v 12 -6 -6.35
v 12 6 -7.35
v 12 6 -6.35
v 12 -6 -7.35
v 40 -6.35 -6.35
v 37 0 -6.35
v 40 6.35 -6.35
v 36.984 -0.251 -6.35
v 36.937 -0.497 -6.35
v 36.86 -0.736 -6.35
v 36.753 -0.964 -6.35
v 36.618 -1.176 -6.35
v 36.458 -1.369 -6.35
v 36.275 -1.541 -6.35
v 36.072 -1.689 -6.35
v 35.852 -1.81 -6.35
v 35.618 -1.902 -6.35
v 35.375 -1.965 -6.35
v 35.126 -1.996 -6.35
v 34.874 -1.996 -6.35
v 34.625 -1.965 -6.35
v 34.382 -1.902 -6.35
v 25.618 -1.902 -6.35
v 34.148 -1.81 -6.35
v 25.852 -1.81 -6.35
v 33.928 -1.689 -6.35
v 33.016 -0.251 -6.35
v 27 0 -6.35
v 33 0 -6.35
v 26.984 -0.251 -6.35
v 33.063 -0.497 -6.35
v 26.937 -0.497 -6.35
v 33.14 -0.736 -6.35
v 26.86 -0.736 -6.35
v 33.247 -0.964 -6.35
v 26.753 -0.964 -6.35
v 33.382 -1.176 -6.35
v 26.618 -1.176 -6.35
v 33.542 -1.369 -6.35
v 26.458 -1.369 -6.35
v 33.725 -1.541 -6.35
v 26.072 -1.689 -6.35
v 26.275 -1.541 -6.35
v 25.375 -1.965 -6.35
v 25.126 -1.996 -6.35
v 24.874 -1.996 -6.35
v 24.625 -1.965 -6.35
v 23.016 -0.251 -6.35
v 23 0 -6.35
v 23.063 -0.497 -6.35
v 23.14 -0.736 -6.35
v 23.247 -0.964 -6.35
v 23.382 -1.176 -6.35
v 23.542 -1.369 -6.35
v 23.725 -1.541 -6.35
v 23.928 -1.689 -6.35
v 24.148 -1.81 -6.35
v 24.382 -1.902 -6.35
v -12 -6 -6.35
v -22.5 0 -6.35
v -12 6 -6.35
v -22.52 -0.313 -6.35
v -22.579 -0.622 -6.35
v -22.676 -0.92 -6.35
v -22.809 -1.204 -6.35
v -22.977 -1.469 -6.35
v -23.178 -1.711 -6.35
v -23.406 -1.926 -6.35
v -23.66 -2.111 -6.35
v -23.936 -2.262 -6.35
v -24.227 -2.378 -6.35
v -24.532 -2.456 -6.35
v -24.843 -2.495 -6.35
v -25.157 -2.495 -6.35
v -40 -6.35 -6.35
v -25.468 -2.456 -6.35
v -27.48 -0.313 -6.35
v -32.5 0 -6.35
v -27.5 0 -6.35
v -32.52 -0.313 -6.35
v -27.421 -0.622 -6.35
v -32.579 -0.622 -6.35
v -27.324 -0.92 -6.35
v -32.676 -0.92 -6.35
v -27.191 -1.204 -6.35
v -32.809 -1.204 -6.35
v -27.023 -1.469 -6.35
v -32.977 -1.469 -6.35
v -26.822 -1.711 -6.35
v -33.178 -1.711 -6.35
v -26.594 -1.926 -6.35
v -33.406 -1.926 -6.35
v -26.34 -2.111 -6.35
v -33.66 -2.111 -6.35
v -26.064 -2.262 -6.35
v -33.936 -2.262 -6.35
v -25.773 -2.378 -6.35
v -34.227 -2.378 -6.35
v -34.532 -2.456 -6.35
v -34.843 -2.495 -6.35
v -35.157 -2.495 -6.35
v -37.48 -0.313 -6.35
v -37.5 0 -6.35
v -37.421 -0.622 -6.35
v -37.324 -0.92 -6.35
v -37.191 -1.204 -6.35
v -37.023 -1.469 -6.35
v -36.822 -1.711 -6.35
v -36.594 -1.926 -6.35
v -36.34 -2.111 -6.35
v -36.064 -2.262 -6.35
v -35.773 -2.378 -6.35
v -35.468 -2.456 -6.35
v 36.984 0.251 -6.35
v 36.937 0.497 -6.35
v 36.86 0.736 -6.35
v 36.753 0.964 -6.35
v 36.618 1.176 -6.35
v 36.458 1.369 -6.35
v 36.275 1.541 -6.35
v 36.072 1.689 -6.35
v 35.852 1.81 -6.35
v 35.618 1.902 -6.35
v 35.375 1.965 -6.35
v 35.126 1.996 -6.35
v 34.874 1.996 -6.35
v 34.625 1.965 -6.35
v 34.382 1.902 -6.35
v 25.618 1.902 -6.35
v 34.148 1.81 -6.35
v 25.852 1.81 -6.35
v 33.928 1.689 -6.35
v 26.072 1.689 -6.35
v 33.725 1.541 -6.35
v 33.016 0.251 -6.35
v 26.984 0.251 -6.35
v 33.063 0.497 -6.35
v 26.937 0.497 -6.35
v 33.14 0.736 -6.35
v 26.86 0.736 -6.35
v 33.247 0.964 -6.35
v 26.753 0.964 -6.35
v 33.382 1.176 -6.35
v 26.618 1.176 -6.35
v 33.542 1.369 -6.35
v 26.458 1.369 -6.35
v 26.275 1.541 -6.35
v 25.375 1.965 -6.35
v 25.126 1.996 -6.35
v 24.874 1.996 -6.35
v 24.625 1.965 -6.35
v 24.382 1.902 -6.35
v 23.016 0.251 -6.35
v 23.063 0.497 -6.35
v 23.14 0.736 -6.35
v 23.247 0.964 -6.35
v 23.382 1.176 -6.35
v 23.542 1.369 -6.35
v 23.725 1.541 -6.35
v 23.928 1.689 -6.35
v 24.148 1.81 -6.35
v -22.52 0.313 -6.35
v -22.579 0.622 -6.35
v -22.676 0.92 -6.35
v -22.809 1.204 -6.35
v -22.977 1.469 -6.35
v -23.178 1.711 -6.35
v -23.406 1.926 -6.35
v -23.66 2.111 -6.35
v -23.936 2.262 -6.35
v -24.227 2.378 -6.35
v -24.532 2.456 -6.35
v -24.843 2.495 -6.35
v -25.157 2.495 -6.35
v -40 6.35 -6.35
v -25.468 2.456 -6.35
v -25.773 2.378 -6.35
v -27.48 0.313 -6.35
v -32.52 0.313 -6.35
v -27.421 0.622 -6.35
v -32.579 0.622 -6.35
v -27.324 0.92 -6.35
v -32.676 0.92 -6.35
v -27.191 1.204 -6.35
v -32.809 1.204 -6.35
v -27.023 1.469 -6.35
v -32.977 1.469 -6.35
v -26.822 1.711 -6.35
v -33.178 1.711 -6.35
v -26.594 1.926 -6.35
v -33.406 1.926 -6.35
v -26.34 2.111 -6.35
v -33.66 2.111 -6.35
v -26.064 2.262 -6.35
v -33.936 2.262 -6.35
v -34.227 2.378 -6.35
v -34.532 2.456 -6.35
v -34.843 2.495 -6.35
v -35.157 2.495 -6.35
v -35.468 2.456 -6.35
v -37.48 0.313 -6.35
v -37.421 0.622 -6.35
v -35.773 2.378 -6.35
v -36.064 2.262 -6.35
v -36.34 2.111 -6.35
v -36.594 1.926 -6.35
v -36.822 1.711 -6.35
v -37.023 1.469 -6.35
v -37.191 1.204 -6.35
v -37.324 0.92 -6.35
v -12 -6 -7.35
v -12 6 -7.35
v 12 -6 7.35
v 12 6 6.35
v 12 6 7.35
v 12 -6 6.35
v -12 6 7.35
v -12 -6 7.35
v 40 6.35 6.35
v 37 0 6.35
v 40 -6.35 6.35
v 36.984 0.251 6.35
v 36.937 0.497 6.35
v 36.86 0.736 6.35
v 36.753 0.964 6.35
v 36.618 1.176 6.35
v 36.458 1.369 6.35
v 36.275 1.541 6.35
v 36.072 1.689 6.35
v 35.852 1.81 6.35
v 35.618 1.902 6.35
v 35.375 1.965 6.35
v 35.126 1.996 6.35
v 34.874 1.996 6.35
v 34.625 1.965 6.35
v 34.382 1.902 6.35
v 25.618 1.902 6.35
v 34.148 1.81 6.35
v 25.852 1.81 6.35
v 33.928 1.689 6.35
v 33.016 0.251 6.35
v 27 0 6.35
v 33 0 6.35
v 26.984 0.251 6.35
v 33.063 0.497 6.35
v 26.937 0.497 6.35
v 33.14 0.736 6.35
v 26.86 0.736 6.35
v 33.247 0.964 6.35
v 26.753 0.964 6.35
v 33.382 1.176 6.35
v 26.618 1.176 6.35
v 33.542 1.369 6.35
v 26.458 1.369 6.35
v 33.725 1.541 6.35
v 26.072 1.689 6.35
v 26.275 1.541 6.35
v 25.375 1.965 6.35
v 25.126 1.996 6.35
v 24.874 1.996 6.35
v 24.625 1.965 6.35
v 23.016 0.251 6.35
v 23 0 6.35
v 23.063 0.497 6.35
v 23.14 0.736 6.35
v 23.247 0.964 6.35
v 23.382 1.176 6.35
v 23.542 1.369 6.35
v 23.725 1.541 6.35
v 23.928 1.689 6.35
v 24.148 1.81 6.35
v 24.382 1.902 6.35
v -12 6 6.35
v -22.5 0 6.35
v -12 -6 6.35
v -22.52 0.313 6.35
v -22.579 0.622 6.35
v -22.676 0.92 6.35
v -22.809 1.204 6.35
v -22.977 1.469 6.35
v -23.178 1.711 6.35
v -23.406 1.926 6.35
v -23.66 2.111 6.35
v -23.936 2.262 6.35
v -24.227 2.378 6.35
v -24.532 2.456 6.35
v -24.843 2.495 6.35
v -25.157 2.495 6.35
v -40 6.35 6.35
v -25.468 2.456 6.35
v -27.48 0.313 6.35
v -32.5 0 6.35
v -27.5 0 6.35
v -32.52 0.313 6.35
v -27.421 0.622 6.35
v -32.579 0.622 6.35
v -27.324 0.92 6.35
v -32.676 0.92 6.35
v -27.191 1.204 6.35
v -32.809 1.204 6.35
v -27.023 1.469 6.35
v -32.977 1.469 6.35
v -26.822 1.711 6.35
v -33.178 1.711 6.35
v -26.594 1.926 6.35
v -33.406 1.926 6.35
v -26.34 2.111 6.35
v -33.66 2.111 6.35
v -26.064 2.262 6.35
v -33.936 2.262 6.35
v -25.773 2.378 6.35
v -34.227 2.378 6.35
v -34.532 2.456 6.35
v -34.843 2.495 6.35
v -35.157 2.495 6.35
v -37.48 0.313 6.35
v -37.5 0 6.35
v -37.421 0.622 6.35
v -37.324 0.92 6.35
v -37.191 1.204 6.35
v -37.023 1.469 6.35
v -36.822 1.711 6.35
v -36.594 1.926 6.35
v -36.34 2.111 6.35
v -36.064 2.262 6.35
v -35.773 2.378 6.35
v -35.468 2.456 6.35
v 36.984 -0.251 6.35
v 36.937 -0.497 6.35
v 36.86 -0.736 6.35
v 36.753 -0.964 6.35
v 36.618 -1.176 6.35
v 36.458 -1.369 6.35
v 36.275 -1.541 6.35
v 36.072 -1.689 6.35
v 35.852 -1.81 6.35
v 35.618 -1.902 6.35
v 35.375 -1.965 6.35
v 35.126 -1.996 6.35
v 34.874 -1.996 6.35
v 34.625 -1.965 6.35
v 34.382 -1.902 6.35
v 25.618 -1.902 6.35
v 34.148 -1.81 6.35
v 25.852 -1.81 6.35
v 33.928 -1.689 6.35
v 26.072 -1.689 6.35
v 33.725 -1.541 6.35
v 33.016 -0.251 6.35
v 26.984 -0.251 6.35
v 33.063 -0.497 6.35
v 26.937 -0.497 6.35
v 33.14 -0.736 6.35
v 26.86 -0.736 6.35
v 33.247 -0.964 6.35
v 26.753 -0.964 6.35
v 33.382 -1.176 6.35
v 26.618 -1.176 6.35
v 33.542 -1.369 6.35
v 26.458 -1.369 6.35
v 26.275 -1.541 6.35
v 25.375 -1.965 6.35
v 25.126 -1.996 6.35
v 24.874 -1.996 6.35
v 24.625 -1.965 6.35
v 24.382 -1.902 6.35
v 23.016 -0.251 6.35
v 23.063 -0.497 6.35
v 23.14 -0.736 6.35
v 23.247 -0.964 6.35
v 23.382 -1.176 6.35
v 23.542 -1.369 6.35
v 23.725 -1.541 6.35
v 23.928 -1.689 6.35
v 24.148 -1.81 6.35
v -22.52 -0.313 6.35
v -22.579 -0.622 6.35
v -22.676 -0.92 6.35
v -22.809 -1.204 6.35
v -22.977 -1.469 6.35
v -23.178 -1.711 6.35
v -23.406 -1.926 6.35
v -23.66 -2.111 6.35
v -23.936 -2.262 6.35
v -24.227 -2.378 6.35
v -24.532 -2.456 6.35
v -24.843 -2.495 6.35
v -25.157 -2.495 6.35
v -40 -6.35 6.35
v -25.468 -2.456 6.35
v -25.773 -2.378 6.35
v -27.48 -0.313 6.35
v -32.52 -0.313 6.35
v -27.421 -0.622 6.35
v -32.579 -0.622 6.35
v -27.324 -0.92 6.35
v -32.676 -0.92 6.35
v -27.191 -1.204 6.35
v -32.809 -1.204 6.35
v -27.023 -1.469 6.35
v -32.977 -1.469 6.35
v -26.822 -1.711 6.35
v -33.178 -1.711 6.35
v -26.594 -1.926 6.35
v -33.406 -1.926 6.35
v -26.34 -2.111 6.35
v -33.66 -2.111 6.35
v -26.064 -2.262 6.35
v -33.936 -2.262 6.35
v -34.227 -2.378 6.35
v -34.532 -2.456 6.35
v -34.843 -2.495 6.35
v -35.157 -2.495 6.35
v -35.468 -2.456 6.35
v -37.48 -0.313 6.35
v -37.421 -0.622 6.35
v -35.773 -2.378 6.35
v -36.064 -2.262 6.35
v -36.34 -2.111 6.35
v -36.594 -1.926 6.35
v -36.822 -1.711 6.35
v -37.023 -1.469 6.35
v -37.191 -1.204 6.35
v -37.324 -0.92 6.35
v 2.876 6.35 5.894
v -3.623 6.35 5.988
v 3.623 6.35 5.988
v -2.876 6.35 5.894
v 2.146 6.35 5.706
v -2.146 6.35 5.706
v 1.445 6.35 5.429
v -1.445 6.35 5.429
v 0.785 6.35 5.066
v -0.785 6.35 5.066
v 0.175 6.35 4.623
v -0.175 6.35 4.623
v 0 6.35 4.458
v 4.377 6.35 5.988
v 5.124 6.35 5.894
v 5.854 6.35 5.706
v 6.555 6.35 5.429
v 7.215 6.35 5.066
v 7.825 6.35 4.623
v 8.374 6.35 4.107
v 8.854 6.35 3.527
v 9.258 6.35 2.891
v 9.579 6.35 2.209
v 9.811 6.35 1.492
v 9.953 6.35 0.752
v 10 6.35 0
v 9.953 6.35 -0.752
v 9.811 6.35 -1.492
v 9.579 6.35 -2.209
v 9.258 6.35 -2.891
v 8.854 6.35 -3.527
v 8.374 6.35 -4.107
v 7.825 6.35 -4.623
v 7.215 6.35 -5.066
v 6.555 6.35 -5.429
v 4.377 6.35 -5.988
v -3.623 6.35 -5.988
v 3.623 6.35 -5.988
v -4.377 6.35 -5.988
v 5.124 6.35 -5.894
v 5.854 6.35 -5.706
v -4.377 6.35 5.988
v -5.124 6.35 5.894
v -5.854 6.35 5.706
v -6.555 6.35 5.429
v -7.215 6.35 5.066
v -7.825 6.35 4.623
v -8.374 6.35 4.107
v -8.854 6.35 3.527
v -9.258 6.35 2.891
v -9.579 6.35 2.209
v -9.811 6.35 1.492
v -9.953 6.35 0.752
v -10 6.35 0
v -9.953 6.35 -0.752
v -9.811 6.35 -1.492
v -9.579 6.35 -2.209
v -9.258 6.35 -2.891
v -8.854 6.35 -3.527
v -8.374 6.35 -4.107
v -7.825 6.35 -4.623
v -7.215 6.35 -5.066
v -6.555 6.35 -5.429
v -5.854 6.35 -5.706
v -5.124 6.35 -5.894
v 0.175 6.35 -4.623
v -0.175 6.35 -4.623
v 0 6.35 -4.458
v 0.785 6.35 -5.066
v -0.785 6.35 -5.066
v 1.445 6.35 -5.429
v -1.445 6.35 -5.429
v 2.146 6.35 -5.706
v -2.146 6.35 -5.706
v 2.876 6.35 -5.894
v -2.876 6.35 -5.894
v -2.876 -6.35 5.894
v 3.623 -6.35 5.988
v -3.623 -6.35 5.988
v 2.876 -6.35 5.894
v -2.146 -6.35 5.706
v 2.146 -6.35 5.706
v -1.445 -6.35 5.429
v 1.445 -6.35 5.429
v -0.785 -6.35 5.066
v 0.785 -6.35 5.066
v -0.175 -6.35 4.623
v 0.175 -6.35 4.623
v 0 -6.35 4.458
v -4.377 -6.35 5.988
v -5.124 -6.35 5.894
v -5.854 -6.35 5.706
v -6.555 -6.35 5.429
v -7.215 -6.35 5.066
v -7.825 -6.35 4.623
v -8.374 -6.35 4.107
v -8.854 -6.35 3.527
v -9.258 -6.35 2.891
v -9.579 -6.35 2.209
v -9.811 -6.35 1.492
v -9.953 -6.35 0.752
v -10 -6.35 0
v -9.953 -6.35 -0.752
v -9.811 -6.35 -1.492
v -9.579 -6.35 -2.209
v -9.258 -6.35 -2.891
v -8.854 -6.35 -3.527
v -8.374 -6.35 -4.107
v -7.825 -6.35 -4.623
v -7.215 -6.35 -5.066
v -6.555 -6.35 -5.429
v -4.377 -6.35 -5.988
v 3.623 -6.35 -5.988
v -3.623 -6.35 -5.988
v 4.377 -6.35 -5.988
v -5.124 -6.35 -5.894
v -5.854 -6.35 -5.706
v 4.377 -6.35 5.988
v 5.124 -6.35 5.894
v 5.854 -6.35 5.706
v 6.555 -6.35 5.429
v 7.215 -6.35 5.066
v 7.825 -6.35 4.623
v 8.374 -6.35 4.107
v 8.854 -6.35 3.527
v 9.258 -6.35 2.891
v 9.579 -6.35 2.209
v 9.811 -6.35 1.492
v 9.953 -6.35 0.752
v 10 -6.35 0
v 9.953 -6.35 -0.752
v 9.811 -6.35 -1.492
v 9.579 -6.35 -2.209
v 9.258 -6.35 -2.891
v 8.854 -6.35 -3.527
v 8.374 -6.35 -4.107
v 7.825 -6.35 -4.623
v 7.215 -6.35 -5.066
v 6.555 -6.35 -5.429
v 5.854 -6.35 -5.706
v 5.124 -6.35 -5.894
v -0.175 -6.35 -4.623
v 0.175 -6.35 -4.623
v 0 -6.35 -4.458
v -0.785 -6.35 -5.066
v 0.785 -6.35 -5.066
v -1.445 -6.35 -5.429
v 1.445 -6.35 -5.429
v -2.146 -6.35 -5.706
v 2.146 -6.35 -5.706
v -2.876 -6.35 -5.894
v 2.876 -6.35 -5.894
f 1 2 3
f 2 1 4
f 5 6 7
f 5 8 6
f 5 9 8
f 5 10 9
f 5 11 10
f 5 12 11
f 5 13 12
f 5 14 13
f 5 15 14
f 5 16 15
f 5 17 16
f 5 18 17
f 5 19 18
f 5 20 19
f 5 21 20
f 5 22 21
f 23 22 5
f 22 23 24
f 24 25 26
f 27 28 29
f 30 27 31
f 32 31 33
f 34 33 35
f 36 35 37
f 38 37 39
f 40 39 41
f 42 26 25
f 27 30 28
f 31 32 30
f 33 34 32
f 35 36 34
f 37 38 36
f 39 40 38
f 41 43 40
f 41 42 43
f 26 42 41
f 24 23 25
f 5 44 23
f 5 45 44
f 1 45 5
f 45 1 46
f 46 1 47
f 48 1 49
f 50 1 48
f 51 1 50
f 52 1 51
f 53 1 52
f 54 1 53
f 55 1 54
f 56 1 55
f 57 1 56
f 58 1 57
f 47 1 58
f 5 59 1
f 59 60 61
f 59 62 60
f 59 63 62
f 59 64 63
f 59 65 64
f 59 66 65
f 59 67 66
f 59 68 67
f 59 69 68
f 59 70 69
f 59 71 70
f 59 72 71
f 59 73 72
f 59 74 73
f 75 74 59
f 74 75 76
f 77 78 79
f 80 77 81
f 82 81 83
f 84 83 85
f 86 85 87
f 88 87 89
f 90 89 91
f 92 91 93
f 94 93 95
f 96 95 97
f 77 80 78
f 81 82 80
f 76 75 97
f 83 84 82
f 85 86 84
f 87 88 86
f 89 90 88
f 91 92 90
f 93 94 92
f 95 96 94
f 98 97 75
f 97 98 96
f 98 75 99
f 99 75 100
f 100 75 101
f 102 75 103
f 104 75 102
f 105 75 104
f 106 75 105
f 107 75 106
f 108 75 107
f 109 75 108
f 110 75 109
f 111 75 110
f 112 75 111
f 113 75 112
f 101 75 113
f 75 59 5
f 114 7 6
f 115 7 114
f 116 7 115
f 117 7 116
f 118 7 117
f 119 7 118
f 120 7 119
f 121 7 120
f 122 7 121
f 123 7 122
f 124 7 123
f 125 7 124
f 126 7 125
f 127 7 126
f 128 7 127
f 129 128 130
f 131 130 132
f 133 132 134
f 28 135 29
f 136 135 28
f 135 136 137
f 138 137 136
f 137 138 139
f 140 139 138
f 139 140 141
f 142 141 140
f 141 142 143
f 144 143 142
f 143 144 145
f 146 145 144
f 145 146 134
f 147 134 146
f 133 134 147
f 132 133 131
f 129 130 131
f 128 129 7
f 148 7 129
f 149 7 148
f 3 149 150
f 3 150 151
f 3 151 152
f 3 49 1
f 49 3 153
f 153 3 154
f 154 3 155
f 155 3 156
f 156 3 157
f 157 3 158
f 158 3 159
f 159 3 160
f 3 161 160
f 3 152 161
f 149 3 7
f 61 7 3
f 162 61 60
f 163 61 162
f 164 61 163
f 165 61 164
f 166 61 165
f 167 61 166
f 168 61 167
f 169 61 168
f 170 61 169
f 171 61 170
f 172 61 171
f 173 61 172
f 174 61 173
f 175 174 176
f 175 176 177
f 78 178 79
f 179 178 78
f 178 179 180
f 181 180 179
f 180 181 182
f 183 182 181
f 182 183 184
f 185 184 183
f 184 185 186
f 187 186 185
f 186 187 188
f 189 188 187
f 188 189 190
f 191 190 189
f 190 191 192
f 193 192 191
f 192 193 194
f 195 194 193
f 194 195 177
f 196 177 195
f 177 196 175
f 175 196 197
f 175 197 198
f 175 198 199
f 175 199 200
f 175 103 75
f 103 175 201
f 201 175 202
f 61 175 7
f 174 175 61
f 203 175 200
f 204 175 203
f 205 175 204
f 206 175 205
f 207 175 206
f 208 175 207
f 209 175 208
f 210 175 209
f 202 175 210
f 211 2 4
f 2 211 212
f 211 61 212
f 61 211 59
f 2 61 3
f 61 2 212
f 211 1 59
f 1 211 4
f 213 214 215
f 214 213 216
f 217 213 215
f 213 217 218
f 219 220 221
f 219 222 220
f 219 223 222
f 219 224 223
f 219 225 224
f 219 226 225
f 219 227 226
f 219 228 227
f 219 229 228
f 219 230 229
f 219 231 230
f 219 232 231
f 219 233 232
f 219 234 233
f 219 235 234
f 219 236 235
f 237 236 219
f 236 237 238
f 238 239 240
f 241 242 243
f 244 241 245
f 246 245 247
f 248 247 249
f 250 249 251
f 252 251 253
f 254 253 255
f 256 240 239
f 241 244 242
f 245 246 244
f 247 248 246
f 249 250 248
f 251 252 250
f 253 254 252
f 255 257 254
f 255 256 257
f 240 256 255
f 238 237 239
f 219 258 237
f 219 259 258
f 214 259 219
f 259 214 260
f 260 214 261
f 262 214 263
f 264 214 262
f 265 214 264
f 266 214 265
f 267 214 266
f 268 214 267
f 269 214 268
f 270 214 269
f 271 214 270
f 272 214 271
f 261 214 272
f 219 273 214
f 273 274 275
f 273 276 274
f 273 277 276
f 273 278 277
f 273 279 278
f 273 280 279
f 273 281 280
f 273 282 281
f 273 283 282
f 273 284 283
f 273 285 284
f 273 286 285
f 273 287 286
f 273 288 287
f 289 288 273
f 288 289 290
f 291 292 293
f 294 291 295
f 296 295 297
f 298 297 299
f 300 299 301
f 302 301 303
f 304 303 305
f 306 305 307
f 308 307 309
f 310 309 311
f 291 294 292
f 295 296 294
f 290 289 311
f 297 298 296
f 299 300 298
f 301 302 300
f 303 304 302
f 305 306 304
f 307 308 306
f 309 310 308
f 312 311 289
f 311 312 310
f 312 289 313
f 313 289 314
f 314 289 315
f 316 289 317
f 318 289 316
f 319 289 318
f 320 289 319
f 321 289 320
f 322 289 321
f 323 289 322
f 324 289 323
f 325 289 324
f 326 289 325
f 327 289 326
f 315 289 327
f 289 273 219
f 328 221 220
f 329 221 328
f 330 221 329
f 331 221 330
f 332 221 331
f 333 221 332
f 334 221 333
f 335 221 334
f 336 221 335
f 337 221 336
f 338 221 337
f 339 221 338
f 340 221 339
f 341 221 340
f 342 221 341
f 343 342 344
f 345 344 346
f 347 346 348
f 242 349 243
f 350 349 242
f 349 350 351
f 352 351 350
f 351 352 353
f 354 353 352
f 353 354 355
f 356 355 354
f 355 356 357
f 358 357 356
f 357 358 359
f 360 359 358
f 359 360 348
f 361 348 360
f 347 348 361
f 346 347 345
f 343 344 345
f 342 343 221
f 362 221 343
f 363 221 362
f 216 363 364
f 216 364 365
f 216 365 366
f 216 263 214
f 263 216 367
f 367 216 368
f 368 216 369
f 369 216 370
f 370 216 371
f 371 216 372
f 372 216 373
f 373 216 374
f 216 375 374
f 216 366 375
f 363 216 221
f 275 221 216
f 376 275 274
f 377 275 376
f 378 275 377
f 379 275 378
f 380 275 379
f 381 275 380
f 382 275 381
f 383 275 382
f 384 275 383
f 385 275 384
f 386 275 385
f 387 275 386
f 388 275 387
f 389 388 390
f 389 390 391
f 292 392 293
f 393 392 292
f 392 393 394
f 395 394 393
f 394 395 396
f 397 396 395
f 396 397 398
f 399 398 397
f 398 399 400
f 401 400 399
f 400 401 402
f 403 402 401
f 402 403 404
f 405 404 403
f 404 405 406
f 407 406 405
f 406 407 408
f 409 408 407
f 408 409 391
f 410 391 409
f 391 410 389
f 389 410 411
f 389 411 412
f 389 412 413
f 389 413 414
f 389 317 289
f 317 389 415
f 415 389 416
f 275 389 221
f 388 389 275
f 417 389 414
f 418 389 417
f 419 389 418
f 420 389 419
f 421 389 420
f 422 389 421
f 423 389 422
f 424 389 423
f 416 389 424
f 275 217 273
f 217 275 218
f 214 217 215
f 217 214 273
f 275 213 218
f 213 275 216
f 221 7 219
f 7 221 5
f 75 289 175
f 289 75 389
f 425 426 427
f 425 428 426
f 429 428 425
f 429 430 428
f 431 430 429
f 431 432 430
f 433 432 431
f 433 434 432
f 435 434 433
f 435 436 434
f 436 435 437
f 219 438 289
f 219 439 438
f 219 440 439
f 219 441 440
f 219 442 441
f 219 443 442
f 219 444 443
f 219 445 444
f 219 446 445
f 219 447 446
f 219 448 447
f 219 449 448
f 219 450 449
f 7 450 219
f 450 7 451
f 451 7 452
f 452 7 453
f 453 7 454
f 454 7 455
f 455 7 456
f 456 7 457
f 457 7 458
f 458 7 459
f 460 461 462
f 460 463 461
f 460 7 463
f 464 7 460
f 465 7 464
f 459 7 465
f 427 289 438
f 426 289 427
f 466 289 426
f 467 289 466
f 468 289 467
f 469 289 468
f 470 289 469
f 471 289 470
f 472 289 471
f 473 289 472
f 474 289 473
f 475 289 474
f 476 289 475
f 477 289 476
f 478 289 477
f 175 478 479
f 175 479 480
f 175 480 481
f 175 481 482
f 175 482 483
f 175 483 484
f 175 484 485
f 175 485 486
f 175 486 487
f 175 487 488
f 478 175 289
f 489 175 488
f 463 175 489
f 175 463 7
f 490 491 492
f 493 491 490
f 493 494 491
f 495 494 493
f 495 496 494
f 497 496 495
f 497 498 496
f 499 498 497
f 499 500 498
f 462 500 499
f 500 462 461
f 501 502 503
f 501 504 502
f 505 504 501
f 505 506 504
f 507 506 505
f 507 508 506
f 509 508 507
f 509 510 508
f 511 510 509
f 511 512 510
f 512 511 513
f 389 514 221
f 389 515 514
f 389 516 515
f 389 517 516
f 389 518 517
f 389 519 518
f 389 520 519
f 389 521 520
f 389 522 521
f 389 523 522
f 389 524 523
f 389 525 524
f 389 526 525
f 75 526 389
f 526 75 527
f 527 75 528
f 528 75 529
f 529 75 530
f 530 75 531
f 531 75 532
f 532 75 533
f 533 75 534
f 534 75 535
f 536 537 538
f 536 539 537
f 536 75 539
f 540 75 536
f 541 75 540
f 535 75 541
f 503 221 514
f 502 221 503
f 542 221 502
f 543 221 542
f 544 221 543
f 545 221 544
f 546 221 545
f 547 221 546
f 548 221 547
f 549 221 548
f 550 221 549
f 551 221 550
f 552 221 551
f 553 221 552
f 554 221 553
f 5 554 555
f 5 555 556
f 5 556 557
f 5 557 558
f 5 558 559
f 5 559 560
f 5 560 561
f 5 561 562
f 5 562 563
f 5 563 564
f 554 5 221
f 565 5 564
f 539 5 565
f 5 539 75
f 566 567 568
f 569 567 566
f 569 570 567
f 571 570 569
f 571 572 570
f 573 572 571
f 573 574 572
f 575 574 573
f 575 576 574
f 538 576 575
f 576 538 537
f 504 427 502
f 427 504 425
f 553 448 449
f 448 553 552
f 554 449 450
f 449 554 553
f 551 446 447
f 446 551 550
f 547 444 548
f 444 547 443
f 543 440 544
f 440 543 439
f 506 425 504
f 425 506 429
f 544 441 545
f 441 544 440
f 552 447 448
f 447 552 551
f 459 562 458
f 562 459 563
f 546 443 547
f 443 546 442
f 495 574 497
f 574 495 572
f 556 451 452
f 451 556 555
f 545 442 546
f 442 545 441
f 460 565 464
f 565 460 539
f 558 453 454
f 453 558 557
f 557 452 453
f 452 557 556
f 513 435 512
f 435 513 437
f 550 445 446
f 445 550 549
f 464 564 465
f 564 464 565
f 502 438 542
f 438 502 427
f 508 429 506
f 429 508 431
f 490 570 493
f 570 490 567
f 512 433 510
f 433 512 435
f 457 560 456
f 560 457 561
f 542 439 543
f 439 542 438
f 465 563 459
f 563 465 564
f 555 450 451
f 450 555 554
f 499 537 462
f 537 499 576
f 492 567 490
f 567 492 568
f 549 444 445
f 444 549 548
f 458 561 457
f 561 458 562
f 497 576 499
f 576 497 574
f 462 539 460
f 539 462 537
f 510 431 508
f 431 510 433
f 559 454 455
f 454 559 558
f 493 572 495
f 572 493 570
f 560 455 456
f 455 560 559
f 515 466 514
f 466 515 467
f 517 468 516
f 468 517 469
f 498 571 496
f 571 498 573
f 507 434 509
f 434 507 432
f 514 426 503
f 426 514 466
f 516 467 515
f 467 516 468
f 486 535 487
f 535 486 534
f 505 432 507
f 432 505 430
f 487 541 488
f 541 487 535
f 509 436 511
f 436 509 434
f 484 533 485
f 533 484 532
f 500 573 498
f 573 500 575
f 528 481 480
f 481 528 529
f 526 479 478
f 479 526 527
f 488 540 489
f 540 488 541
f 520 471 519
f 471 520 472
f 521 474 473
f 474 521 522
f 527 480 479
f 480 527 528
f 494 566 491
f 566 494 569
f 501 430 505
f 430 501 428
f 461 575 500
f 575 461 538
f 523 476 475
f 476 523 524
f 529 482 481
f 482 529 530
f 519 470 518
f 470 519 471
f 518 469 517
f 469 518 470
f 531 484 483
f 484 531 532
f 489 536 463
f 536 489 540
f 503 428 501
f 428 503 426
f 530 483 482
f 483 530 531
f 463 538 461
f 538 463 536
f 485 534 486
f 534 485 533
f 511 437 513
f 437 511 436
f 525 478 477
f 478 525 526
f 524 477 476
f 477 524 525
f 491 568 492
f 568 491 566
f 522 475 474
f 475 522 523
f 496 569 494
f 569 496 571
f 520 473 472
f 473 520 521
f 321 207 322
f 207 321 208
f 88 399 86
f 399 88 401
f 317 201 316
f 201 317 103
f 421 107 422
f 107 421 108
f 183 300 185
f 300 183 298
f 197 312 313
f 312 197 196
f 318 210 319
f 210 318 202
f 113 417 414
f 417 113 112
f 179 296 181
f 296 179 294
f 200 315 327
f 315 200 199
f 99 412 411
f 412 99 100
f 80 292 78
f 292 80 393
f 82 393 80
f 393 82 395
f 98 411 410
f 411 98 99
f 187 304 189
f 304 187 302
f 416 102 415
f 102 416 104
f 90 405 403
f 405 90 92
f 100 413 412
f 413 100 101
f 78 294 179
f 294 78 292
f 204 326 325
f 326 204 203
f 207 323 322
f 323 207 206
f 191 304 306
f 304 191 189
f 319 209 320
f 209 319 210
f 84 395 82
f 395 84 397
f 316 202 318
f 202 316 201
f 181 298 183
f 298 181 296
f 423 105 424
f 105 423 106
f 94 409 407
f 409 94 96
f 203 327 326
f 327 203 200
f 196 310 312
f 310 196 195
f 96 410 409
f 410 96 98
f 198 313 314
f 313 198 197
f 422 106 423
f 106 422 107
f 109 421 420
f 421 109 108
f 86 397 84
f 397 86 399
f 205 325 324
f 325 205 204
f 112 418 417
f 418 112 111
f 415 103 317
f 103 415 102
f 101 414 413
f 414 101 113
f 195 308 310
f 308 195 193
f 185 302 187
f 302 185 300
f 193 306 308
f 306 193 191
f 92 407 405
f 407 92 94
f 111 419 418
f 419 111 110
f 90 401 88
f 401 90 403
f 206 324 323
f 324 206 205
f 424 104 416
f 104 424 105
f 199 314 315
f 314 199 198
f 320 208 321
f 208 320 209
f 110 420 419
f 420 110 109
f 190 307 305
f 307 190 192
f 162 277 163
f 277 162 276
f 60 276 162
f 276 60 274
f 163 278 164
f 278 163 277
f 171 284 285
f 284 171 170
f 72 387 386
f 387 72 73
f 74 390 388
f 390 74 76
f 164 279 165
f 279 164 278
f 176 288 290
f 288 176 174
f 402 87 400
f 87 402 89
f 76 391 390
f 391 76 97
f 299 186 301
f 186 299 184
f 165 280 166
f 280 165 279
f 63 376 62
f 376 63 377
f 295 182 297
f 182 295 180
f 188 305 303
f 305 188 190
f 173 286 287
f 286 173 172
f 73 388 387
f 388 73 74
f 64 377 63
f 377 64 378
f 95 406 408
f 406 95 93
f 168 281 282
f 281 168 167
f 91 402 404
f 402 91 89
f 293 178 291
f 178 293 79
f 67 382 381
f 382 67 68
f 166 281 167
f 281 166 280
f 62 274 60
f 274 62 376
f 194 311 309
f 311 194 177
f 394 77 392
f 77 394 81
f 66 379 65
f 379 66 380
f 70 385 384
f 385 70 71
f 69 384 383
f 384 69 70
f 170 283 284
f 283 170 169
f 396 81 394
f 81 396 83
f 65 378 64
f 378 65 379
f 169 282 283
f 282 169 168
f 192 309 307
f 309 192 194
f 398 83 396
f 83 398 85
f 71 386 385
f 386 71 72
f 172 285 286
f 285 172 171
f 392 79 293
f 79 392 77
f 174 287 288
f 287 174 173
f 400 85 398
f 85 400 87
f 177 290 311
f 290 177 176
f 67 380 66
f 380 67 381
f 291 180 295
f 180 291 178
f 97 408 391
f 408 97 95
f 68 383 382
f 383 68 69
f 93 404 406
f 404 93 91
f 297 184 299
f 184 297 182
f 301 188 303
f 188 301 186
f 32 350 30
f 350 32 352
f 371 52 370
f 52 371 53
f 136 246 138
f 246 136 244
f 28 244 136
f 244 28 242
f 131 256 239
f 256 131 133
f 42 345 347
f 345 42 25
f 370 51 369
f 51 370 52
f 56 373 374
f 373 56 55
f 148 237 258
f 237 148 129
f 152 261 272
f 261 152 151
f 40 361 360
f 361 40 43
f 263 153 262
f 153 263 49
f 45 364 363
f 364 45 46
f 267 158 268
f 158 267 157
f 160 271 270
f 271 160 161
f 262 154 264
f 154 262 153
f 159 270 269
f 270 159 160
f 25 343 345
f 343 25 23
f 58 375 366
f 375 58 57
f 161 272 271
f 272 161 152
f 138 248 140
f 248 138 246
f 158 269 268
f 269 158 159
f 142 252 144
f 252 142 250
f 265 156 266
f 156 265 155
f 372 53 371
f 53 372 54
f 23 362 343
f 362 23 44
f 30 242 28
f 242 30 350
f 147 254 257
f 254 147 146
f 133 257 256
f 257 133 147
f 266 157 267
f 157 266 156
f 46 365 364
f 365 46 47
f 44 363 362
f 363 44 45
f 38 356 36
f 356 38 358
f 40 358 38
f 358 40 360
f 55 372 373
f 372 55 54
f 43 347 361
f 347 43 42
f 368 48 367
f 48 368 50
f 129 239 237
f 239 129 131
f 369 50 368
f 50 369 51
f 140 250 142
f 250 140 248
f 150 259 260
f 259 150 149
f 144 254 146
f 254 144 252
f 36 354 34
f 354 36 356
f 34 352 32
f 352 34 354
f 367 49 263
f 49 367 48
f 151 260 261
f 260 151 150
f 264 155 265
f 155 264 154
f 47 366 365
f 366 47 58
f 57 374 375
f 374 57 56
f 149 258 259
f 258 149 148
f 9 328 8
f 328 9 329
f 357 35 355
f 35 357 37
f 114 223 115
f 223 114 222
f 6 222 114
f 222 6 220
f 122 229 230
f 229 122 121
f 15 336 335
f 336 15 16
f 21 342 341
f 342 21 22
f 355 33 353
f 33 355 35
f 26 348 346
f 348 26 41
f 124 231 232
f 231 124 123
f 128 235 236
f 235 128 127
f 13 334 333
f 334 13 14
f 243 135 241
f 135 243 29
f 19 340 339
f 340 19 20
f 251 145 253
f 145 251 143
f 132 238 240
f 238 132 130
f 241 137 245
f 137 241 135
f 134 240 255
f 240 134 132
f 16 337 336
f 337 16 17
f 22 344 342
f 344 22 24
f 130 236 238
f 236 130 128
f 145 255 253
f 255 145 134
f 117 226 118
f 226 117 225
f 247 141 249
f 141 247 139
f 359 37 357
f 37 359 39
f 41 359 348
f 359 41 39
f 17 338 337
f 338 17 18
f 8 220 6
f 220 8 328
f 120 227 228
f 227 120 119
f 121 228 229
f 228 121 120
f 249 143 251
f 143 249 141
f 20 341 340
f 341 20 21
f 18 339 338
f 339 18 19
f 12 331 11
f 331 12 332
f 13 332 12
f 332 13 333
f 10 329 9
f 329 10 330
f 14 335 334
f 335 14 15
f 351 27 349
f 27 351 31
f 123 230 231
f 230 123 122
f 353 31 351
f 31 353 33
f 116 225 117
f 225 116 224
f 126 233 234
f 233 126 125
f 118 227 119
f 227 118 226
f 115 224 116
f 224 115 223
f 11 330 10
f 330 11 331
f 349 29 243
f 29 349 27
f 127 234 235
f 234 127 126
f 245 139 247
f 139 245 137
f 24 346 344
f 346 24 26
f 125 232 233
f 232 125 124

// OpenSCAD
/**
 * @file load_cell_generator.scad
 * @brief Generates a load cell with strain gages and cable routing.
 */

/**
 * Generates a load cell with strain gages and cable routing.
 *
 * @param {number} cell_dims[1] - Width of the load cell.
 * @param {number} cell_dims[0] - Length of the load cell.
 * @param {number} cell_dims[2] - Height of the load cell.
 * @param {number[]} sensor_dims - Dimensions of the strain gages.
 * @param {string} [load_cell_color="silver"] - Color of the load cell.
 * @param {string} [sensor_color="white"] - Color of the strain gages.
 */
module load_cell_generator(cell_dims, sensor_dims, center_cutout, screw_holes, side_cuts = undef,
                           load_cell_color = "silver", sensor_color = "white")
{
    difference()
    {
        union()
        {
            // main body
            color(load_cell_color) cube([ cell_dims[0], cell_dims[1], cell_dims[2] ], center = true);

            // strain gages
            color(
                sensor_color) for (dz =
                                       [
                                           -cell_dims[2] / 2 - sensor_dims[2] / 2, cell_dims[2] / 2 + sensor_dims[2] / 2
                                       ]) translate([ 0, 0, dz ])
                cube([ sensor_dims[0], sensor_dims[1], sensor_dims[2] ], center = true);

            // cable routing on one side
            // color(sensor_color) translate([ 7 + 10, cell_dims[1] / 2, 0 ]) cube([ 14, 1, cell_dims[2] ], center =
            // true);
        }

        // optional side cutouts
        if (!is_undef(side_cuts[0]))
        {
            for (dy = [ -cell_dims[1] / 2, cell_dims[1] / 2 ])
                hull()
                {
                    translate([ -side_cuts[0] / 2 + 2, dy, 0 ])
                        cylinder(d = side_cuts[1] * 2, h = cell_dims[2] + 1, center = true, $fn = 15);
                    translate([ +side_cuts[0] / 2 - 2, dy, 0 ])
                        cylinder(d = side_cuts[1] * 2, h = cell_dims[2] + 1, center = true, $fn = 15);
                }
        }

        // center cylindrical cutouts
        for (dx = [ center_cutout[1][0], center_cutout[2][0] ])
            translate([ dx, 0, 0 ]) rotate([ 90, 0, 0 ])
                cylinder(d = center_cutout[0], h = cell_dims[1] + 1, center = true, $fn = 50);

        // optional rectangular center cutout
        if (!is_undef(center_cutout[3]))
            cube([ abs(center_cutout[2][0]) + abs(center_cutout[1][0]), cell_dims[0] + 1, center_cutout[3] ],
                 center = true);

        // screw holes
        for (i = [0:len(screw_holes) - 1])
        {
            hole = screw_holes[i];
            translate([ hole[1][0], hole[1][1], 0 ])
                cylinder(d = hole[0], h = 1 + cell_dims[1] + 1, center = true, $fn = 50);
            translate([ hole[2][0], hole[2][1], 0 ])
                cylinder(d = hole[0], h = 1 + cell_dims[1] + 1, center = true, $fn = 50);
        }
    }
}

// test values, follows TAL220
test_cell_length = 80;
test_cell_width = 12.7;
test_cell_height = 12.7;

test_cell_dims = [ test_cell_length, test_cell_width, test_cell_height ];

test_sensor_length = 24;
test_sensor_width = 12;
test_sensor_height = 1;
test_sensor_dims = [ test_sensor_length, test_sensor_width, test_sensor_height ];

test_hole_1_diameter = 5.0;
test_hole_1_location_A = [ -35, 0 ];
test_hole_1_location_B = [ -25, 0 ];

test_hole_2_diameter = 4.0;
test_hole_2_location_A = [ 25, 0 ];
test_hole_2_location_B = [ 35, 0 ];

test_screw_holes = [[test_hole_1_diameter, test_hole_1_location_A, test_hole_1_location_B],
                    [test_hole_2_diameter, test_hole_2_location_A, test_hole_2_location_B]];

test_center_cutout_diameter = 12.0;
test_center_cutout_location_A = [ 4, 0 ];
test_center_cutout_location_B = [ -4, 0 ];

test_center_cutout = [ test_center_cutout_diameter, test_center_cutout_location_A, test_center_cutout_location_B ];

center_cutout = [];

load_cell_generator(cell_dims = test_cell_dims, sensor_dims = test_sensor_dims, center_cutout = test_center_cutout,
                    screw_holes = test_screw_holes);
